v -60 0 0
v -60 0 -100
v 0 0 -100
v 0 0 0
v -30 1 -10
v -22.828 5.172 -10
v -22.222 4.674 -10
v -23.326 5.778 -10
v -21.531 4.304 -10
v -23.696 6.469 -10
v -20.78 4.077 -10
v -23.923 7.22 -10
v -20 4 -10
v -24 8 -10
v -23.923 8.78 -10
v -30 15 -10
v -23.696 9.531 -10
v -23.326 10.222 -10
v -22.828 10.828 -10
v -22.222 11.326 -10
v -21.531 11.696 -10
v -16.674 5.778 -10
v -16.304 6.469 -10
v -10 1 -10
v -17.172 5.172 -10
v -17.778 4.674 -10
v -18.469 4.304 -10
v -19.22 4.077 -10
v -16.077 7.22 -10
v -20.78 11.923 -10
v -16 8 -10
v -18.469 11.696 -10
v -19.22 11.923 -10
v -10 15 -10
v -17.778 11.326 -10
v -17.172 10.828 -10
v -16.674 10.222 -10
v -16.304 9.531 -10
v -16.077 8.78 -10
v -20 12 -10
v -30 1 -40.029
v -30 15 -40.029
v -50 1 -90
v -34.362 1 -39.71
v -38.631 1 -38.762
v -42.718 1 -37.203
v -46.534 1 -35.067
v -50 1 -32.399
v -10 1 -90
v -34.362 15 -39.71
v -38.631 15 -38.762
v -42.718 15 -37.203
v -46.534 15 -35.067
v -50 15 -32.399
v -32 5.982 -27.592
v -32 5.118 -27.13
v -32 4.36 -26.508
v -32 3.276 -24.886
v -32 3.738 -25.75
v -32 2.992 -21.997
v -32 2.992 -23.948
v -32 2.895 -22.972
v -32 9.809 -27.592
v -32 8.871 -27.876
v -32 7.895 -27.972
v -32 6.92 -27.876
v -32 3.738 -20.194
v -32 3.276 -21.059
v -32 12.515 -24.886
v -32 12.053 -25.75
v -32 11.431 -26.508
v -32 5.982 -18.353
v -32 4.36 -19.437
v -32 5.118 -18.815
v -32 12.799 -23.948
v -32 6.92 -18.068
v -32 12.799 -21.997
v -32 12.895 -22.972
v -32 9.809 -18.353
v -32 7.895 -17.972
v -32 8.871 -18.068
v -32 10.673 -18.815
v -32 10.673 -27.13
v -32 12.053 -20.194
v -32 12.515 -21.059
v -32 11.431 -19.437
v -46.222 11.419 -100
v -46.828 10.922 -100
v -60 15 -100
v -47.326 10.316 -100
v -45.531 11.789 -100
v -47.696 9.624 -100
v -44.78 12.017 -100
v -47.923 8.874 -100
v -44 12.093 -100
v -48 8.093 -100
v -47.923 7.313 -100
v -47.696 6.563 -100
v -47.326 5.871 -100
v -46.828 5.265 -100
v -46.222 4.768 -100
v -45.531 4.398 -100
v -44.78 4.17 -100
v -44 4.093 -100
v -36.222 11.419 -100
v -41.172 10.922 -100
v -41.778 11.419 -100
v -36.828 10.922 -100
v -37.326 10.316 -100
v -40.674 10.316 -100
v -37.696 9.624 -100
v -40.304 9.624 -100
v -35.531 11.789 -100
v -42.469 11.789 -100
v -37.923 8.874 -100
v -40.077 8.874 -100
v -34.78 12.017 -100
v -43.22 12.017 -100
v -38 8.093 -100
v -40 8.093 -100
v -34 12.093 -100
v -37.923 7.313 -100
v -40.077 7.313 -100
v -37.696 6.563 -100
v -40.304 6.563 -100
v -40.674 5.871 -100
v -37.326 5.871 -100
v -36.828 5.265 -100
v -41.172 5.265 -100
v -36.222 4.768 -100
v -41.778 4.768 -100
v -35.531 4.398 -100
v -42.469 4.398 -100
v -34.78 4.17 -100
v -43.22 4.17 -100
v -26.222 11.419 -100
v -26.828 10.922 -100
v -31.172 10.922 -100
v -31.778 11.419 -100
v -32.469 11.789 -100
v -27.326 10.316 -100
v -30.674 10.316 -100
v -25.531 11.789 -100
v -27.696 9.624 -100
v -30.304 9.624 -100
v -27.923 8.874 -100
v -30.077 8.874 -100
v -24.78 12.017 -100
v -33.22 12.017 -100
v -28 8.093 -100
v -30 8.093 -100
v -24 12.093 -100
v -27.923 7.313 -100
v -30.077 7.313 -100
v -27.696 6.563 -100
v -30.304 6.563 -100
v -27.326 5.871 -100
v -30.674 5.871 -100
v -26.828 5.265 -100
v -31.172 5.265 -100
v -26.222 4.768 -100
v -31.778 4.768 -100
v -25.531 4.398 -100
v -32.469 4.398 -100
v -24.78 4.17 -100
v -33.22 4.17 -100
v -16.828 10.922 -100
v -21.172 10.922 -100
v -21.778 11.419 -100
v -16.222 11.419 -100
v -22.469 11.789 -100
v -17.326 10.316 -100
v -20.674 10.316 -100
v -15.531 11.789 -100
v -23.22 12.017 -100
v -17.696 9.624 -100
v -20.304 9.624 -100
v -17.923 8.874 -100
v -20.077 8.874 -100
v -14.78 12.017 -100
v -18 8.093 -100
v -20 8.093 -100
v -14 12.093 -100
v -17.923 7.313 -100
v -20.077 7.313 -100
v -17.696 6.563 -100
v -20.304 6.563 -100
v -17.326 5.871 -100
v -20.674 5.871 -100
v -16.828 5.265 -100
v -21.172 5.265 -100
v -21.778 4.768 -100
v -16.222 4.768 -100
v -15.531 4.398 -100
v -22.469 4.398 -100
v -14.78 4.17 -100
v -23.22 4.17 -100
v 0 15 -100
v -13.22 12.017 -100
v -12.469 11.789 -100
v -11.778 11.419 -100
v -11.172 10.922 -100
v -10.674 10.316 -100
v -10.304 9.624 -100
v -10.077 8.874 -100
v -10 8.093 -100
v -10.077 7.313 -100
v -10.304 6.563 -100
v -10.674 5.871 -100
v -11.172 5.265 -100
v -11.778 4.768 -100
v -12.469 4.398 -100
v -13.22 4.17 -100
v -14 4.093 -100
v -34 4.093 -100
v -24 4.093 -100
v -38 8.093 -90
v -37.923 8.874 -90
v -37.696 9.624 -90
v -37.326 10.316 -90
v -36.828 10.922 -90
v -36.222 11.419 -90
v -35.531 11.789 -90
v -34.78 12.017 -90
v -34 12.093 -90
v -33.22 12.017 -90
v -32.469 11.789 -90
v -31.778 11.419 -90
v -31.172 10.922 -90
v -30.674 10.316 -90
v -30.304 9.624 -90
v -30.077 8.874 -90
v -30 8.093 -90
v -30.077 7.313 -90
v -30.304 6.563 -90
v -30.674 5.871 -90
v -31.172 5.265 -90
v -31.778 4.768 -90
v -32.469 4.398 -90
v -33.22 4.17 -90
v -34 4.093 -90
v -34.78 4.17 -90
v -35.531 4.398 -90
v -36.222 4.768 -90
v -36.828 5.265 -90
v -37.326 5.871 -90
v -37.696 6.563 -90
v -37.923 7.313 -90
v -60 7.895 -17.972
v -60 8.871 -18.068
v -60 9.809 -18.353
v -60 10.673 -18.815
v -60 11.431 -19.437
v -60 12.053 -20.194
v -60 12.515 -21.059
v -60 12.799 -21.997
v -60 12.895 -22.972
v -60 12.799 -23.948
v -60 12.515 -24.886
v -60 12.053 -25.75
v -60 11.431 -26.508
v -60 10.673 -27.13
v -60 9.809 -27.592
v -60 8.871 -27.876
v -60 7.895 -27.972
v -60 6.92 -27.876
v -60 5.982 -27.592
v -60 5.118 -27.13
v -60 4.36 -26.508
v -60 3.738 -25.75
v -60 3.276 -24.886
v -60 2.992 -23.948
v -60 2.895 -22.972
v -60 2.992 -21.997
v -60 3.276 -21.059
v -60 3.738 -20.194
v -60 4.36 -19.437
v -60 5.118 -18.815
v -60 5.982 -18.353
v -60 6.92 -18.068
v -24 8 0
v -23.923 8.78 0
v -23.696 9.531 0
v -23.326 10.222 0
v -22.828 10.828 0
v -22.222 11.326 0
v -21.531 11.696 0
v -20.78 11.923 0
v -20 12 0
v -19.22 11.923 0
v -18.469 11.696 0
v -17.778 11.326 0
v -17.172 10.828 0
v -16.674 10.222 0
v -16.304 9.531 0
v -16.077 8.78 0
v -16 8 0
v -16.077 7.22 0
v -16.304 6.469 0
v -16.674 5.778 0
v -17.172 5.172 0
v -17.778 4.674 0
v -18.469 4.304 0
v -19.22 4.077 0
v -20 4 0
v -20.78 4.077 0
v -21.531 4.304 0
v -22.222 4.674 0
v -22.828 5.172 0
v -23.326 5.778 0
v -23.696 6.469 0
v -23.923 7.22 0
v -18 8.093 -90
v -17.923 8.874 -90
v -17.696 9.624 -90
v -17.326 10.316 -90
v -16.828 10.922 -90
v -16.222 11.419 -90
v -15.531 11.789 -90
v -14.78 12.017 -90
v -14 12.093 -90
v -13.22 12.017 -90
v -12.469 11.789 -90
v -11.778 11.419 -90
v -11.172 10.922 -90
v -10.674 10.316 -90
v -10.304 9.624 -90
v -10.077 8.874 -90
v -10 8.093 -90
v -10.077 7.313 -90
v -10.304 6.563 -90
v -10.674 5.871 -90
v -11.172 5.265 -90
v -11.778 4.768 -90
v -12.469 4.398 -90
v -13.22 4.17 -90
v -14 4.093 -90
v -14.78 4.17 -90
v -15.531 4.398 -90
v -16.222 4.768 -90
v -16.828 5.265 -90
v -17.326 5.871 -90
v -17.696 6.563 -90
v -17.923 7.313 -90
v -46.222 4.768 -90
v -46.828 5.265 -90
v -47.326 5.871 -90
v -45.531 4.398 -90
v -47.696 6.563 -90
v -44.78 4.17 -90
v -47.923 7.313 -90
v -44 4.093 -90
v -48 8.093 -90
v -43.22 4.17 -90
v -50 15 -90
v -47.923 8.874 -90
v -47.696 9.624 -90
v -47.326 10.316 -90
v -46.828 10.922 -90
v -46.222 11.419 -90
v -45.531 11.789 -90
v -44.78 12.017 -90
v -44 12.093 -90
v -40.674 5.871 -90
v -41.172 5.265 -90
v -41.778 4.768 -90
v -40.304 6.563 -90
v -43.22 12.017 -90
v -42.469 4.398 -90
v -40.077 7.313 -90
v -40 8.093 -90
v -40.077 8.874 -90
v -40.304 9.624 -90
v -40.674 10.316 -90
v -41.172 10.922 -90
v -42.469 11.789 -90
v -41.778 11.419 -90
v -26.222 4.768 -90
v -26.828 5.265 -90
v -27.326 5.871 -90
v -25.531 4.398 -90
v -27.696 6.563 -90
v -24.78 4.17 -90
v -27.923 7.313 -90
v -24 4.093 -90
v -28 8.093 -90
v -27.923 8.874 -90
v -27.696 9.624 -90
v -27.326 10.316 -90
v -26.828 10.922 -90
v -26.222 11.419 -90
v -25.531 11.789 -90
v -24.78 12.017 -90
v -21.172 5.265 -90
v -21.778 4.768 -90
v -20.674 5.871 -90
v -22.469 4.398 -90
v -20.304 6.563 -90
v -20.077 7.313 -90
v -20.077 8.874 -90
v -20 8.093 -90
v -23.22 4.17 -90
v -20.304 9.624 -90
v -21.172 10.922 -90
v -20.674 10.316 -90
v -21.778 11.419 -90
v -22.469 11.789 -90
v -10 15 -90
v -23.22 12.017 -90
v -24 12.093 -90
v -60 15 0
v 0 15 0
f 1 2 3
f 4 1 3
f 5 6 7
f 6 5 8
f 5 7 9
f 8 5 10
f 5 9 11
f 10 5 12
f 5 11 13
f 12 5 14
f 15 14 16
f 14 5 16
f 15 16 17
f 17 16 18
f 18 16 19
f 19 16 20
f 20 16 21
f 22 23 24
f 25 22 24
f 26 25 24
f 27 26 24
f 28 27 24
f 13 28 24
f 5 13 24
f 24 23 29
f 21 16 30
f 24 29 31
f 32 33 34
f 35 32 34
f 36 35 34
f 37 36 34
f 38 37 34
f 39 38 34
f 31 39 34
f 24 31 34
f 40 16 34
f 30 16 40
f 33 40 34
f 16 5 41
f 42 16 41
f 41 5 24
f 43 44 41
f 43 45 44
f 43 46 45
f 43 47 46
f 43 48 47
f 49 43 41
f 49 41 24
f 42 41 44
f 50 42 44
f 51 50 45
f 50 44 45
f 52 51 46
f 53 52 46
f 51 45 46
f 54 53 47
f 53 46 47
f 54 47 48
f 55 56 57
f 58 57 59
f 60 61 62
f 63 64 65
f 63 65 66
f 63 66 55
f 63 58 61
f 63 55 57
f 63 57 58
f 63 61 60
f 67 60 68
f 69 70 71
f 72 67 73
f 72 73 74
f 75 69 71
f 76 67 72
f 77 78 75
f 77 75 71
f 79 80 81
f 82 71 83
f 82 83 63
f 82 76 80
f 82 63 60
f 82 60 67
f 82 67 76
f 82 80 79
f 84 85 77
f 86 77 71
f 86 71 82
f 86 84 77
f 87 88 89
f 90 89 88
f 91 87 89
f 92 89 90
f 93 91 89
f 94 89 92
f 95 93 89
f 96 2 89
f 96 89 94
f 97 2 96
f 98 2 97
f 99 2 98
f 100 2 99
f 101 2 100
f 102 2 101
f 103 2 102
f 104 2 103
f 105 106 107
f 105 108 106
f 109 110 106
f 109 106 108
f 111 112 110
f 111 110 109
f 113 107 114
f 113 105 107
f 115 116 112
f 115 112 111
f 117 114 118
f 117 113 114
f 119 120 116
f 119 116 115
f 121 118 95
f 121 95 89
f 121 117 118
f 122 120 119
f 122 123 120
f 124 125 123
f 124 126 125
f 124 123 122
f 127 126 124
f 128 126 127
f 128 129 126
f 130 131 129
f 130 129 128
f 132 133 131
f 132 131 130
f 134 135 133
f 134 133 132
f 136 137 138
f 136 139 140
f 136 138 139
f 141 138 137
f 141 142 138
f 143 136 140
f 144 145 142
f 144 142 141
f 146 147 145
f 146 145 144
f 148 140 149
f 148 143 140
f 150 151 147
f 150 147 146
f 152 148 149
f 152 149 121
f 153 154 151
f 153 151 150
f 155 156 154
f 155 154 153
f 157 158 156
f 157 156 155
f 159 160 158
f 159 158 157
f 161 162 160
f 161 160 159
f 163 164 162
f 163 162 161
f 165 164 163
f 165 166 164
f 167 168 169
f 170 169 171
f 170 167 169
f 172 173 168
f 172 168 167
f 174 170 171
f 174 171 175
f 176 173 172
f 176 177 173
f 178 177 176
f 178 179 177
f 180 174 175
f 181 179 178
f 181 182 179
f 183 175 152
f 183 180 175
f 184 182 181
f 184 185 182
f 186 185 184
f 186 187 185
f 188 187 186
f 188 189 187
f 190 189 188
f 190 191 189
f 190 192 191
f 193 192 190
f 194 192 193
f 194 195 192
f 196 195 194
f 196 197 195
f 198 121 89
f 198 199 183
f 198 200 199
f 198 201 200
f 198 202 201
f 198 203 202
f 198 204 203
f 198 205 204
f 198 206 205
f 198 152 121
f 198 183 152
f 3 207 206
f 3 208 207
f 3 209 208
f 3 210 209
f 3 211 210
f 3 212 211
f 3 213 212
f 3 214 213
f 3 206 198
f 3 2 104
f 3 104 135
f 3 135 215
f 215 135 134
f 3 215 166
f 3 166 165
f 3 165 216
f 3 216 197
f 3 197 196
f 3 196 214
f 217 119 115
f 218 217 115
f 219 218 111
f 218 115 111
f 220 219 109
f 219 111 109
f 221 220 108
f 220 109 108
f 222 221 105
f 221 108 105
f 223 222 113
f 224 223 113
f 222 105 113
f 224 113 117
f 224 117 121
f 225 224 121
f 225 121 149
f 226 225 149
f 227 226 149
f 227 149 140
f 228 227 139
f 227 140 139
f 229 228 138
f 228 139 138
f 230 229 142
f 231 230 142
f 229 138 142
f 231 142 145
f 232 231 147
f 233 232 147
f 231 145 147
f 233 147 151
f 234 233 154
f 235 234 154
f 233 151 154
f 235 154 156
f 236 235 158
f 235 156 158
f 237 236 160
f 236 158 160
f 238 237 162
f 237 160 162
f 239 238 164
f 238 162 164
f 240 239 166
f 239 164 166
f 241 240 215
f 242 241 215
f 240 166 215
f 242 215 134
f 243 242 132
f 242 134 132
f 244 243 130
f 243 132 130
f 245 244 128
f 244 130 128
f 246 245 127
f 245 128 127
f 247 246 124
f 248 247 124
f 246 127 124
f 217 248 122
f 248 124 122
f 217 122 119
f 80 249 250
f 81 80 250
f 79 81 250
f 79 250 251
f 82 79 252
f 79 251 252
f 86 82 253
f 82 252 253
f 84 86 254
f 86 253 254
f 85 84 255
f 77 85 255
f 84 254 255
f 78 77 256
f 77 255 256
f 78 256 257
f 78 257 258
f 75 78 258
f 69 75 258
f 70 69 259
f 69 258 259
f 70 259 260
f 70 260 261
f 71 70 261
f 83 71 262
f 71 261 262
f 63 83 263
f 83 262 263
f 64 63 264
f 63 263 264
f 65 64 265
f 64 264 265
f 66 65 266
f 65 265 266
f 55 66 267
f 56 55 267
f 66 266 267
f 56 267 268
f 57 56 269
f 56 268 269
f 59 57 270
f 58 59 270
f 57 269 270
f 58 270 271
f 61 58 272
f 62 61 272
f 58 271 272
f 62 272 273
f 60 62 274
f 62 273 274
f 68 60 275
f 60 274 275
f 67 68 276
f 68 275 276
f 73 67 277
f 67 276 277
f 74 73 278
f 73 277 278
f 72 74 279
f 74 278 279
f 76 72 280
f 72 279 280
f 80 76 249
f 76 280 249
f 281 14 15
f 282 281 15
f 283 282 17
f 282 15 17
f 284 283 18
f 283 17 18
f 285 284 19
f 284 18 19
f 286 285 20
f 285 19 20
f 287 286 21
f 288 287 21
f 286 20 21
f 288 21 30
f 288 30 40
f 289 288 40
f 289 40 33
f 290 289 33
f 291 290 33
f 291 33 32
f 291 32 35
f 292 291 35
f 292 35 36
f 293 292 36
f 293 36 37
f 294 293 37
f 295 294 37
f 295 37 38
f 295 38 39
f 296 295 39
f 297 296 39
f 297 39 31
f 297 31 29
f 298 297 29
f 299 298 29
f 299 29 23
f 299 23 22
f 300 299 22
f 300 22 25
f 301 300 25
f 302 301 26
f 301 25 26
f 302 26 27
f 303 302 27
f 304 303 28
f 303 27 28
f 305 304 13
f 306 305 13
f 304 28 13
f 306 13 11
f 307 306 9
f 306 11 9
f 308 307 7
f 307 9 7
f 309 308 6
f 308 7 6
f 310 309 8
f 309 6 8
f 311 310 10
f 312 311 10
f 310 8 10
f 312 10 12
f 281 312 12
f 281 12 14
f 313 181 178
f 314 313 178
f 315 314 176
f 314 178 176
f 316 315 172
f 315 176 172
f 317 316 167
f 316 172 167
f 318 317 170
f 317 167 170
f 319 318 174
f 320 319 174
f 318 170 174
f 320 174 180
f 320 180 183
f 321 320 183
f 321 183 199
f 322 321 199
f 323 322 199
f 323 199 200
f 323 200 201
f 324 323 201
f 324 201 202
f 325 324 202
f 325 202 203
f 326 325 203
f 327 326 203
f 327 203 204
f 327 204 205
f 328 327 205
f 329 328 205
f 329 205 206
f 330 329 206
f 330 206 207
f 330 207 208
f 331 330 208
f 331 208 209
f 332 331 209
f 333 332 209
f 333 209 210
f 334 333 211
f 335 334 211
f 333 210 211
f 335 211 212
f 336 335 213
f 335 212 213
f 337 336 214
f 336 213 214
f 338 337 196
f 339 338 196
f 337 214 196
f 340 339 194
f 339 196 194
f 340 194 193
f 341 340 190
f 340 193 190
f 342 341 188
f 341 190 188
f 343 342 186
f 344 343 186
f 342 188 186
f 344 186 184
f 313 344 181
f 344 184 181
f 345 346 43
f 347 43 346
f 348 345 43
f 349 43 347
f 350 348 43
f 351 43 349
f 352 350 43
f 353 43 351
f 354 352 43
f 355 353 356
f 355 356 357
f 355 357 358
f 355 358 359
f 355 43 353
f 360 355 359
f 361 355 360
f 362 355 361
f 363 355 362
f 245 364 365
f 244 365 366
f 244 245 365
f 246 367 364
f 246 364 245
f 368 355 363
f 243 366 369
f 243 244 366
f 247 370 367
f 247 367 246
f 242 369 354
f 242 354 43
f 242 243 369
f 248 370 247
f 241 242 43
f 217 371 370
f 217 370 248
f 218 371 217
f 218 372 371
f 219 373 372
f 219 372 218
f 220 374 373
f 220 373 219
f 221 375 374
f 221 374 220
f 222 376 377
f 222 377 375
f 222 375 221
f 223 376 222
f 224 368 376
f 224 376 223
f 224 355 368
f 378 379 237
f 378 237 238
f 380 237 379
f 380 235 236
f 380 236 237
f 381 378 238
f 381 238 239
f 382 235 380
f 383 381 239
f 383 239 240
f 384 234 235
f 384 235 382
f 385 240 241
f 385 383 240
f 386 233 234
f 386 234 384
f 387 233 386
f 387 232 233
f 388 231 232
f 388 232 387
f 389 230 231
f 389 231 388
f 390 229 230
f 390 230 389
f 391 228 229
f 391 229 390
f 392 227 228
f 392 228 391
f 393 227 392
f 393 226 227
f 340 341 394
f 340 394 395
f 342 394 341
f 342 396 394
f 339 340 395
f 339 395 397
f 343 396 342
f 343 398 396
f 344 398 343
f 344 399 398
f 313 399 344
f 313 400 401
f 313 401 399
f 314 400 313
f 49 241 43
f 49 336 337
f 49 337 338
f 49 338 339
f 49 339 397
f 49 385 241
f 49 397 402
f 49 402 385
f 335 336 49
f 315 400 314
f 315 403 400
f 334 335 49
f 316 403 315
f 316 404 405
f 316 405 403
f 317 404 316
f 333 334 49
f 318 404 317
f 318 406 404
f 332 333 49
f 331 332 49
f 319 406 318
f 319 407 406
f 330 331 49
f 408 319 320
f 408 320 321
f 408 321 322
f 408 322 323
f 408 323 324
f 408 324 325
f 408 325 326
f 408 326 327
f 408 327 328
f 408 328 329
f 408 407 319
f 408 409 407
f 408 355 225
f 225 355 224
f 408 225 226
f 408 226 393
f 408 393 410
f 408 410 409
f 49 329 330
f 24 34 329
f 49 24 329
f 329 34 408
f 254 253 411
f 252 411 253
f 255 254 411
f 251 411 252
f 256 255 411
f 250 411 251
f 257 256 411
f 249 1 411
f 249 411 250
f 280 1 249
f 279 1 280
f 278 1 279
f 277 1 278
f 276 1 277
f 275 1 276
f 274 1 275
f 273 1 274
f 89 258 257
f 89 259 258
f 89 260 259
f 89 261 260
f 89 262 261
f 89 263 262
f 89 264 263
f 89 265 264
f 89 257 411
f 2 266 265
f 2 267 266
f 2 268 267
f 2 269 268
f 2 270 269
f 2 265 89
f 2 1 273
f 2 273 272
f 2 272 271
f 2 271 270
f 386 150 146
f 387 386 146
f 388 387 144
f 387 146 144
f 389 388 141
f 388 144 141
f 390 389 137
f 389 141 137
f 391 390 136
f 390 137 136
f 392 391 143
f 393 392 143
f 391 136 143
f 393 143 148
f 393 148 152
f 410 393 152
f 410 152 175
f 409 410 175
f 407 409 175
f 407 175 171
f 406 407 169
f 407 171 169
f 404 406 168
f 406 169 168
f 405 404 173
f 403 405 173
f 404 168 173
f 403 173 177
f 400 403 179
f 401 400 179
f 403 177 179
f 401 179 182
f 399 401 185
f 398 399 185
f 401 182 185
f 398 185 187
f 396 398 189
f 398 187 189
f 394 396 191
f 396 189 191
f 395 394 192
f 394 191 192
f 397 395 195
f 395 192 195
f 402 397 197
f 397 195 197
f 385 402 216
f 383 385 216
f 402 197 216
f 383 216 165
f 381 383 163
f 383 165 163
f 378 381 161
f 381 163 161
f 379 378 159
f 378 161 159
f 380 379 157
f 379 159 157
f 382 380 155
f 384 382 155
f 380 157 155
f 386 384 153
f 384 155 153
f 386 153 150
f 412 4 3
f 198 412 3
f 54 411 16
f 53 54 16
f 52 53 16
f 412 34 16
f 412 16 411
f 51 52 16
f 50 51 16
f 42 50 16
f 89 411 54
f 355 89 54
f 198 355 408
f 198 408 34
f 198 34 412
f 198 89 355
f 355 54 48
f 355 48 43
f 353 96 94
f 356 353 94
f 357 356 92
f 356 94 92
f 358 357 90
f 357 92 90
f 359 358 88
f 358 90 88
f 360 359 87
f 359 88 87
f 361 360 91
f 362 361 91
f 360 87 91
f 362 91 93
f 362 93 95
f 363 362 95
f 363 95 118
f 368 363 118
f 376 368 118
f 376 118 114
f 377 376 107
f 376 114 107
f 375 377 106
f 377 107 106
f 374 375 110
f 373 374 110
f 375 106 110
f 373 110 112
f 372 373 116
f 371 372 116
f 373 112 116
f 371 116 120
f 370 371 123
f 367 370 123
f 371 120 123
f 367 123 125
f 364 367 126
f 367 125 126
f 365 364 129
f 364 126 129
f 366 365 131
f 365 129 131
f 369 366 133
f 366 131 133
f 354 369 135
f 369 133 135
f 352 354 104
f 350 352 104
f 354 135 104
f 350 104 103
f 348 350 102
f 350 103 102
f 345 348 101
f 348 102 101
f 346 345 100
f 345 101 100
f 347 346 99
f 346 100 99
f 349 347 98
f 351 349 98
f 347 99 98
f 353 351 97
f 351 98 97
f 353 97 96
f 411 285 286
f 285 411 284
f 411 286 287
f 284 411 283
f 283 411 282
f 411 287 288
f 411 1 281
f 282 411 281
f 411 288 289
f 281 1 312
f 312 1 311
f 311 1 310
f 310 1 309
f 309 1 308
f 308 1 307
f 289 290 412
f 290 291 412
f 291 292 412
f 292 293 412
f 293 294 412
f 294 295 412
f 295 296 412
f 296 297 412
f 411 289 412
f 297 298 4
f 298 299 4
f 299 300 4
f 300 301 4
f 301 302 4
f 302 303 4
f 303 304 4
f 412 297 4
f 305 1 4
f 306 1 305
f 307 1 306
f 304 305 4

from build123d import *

# Parameters (mm, degrees)
CROQUIS1_W              = 60
CROQUIS1_H              = 100
SALIENTE_EXTRUIR3_DEPTH = 15
CROQUIS2_W              = 40
CROQUIS2_H              = 80
CORTAR_EXTRUIR1_DEPTH   = 14
SALIENTE_EXTRUIR4_DEPTH = 14
CROQUIS4_R              = 4
CORTAR_EXTRUIR2_DEPTH   = 10
CROQUIS5_R              = 4
CORTAR_EXTRUIR3_DEPTH   = 11
CROQUIS7_R              = 5
CORTAR_EXTRUIR5_DEPTH   = 28


with BuildPart() as part:
    # Croquis1 → Saliente-Extruir3 (new body)
    with BuildSketch(Plane(origin=(0, 0, 0), x_dir=(1, 0, 0), z_dir=(0, 1, 0))):
        with Locations((-30, 50)):
            Rectangle(CROQUIS1_W, CROQUIS1_H)
    extrude(amount=SALIENTE_EXTRUIR3_DEPTH)

    # Croquis2 → Cortar-Extruir1 (cut)
    with BuildSketch(Plane(origin=(0, 15, 0), x_dir=(1, 0, 0), z_dir=(0, 1, 0))):
        with Locations((-30, 50)):
            Rectangle(CROQUIS2_W, CROQUIS2_H)
    extrude(amount=-CORTAR_EXTRUIR1_DEPTH, mode=Mode.SUBTRACT)

    # Croquis3 → Saliente-Extruir4 (add)
    with BuildSketch(Plane(origin=(0, 1, 0), x_dir=(1, 0, 0), z_dir=(0, 1, 0))):
        with BuildLine():
            Line((-50, 10), (-30, 10))
            Line((-30, 10), (-30, 40.028839229))
            ThreePointArc((-30, 40.028839229), (-40.702908507, 38.056709268), (-50, 32.399356809))
            Line((-50, 32.399356809), (-50, 10))
        make_face()
    extrude(amount=SALIENTE_EXTRUIR4_DEPTH)

    # Croquis4 → Cortar-Extruir2 (cut)
    with BuildSketch(Plane(origin=(0, 0, -100), x_dir=(-1, 0, 0), z_dir=(0, 0, -1))):
        with Locations((14, 8.093468363)):
            Circle(CROQUIS4_R)
        with Locations((24, 8.093468363)):
            Circle(CROQUIS4_R)
        with Locations((34, 8.093468363)):
            Circle(CROQUIS4_R)
        with Locations((44, 8.093468363)):
            Circle(CROQUIS4_R)
    extrude(amount=-CORTAR_EXTRUIR2_DEPTH, mode=Mode.SUBTRACT)

    # Croquis5 → Cortar-Extruir3 (cut)
    with BuildSketch(Plane(origin=(0, 0, -10), x_dir=(-1, 0, 0), z_dir=(0, 0, -1))):
        with Locations((20, 8)):
            Circle(CROQUIS5_R)
    extrude(amount=-CORTAR_EXTRUIR3_DEPTH, mode=Mode.SUBTRACT)

    # Croquis7 → Cortar-Extruir5 (cut)
    with BuildSketch(Plane.ZY.offset(60)):
        with Locations((-22.972155743, 7.895487944)):
            Circle(CROQUIS7_R)
    extrude(amount=-CORTAR_EXTRUIR5_DEPTH, mode=Mode.SUBTRACT)


solid = part.part
